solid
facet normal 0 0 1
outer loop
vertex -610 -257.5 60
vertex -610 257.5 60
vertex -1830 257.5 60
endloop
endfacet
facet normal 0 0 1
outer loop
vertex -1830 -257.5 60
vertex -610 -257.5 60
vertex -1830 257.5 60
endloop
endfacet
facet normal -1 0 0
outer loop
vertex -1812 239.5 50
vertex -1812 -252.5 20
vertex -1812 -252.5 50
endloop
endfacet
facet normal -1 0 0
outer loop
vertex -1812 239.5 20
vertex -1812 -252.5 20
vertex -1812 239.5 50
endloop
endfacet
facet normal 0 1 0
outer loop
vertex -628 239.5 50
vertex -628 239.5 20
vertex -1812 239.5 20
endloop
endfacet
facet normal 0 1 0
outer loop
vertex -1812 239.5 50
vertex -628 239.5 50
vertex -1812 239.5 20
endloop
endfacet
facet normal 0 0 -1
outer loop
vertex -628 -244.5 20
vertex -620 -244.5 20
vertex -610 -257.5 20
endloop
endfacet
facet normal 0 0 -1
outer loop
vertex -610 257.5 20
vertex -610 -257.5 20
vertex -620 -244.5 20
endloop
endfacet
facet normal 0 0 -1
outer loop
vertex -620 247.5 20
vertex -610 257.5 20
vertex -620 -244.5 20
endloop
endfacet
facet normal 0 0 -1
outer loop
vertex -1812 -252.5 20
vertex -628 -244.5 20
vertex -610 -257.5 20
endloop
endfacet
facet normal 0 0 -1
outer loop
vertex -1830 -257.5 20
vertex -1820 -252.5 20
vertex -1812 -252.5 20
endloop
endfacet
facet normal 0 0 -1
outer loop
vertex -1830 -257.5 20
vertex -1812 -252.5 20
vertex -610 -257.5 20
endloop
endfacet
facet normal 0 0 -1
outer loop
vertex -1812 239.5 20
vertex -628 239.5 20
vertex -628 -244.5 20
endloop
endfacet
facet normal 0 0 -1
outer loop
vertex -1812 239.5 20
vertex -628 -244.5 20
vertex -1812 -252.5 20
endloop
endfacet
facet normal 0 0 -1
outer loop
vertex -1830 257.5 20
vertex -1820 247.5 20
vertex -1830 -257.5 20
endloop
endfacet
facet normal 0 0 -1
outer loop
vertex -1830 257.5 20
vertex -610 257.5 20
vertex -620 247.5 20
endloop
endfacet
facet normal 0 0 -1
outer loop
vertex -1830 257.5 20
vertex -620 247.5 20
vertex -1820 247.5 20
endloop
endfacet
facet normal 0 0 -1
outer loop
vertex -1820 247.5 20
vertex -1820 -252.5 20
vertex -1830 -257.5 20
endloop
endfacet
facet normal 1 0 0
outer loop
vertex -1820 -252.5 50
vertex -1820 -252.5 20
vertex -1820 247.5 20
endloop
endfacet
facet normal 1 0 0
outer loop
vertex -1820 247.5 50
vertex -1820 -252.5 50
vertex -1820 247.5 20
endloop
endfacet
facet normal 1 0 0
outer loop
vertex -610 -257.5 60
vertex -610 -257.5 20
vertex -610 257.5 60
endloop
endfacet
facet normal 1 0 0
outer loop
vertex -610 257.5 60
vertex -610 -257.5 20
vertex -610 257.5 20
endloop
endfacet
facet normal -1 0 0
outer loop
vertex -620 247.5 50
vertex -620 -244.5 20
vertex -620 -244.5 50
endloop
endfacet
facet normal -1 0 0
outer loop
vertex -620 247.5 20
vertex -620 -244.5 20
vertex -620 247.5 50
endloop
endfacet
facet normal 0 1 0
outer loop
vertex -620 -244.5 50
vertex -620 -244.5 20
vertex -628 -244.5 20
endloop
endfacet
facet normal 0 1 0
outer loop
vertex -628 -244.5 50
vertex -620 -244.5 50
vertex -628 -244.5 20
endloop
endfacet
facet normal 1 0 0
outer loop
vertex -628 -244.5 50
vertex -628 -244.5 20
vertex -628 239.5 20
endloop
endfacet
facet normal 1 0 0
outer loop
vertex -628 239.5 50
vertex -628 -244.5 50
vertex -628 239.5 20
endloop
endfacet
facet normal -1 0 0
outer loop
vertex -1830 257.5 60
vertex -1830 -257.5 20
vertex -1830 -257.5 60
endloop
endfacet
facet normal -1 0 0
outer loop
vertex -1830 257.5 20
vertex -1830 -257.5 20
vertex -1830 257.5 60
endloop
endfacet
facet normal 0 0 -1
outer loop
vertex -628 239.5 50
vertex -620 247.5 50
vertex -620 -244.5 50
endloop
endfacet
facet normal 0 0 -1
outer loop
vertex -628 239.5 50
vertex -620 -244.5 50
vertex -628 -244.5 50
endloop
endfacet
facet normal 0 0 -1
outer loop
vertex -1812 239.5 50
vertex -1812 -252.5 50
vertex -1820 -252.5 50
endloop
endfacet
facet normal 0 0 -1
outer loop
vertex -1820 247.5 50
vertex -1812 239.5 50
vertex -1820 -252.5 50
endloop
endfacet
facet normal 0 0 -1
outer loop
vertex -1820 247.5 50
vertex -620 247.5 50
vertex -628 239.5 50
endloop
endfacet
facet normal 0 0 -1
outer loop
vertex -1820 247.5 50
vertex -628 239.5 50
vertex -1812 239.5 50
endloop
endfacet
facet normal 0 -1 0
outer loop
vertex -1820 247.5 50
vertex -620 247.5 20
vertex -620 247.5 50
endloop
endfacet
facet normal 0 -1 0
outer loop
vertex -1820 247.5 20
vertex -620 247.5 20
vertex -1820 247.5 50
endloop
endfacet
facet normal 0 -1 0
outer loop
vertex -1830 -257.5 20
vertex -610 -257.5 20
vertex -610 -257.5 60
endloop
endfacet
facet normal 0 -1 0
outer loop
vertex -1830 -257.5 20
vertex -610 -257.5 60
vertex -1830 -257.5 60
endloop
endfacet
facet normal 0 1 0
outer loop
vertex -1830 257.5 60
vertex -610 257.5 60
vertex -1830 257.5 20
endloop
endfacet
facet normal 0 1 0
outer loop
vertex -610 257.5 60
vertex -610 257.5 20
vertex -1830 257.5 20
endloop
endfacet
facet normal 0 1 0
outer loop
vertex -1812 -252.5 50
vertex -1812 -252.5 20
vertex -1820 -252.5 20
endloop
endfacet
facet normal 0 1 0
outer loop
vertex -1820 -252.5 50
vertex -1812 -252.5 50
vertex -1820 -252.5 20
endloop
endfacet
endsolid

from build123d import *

# Parameters (mm, degrees)
F0_W     = 1220
F0_H     = 515
F1_DEPTH = 20
F2_W     = 1200
F2_H     = 8
F3_DEPTH = 30
F4_W     = 8
F4_H     = 492
F5_DEPTH = 30
F6_W     = 8
F6_H     = 492
F7_DEPTH = 30
F8_ANGLE = 180


with BuildPart() as f1:
    # F0 (on Top) → F1 (new body, symmetric)
    with BuildSketch(Plane.XY):
        Rectangle(F0_W, F0_H)
    extrude(amount=F1_DEPTH, both=True)

    # F2 (on face) → F3 (cut)
    with BuildSketch(Plane.XY.offset(20)):
        with Locations((0, 243.5)):
            Rectangle(F2_W, F2_H)
    extrude(amount=-F3_DEPTH, mode=Mode.SUBTRACT)

    # F4 (on face) → F5 (cut)
    with BuildSketch(Plane.XY.offset(20)):
        with Locations((-596, 1.5)):
            Rectangle(F4_W, F4_H)
    extrude(amount=-F5_DEPTH, mode=Mode.SUBTRACT)

    # F6 (on face) → F7 (cut)
    with BuildSketch(Plane.XY.offset(20)):
        with Locations((596, -6.5)):
            Rectangle(F6_W, F6_H)
    extrude(amount=-F7_DEPTH, mode=Mode.SUBTRACT)


with BuildPart() as f1_1:
    # F8: moved
    add(f1.part.rotate(Axis((-610, 0, 20), (0, 1, 0)), F8_ANGLE))


solid = f1_1.part
